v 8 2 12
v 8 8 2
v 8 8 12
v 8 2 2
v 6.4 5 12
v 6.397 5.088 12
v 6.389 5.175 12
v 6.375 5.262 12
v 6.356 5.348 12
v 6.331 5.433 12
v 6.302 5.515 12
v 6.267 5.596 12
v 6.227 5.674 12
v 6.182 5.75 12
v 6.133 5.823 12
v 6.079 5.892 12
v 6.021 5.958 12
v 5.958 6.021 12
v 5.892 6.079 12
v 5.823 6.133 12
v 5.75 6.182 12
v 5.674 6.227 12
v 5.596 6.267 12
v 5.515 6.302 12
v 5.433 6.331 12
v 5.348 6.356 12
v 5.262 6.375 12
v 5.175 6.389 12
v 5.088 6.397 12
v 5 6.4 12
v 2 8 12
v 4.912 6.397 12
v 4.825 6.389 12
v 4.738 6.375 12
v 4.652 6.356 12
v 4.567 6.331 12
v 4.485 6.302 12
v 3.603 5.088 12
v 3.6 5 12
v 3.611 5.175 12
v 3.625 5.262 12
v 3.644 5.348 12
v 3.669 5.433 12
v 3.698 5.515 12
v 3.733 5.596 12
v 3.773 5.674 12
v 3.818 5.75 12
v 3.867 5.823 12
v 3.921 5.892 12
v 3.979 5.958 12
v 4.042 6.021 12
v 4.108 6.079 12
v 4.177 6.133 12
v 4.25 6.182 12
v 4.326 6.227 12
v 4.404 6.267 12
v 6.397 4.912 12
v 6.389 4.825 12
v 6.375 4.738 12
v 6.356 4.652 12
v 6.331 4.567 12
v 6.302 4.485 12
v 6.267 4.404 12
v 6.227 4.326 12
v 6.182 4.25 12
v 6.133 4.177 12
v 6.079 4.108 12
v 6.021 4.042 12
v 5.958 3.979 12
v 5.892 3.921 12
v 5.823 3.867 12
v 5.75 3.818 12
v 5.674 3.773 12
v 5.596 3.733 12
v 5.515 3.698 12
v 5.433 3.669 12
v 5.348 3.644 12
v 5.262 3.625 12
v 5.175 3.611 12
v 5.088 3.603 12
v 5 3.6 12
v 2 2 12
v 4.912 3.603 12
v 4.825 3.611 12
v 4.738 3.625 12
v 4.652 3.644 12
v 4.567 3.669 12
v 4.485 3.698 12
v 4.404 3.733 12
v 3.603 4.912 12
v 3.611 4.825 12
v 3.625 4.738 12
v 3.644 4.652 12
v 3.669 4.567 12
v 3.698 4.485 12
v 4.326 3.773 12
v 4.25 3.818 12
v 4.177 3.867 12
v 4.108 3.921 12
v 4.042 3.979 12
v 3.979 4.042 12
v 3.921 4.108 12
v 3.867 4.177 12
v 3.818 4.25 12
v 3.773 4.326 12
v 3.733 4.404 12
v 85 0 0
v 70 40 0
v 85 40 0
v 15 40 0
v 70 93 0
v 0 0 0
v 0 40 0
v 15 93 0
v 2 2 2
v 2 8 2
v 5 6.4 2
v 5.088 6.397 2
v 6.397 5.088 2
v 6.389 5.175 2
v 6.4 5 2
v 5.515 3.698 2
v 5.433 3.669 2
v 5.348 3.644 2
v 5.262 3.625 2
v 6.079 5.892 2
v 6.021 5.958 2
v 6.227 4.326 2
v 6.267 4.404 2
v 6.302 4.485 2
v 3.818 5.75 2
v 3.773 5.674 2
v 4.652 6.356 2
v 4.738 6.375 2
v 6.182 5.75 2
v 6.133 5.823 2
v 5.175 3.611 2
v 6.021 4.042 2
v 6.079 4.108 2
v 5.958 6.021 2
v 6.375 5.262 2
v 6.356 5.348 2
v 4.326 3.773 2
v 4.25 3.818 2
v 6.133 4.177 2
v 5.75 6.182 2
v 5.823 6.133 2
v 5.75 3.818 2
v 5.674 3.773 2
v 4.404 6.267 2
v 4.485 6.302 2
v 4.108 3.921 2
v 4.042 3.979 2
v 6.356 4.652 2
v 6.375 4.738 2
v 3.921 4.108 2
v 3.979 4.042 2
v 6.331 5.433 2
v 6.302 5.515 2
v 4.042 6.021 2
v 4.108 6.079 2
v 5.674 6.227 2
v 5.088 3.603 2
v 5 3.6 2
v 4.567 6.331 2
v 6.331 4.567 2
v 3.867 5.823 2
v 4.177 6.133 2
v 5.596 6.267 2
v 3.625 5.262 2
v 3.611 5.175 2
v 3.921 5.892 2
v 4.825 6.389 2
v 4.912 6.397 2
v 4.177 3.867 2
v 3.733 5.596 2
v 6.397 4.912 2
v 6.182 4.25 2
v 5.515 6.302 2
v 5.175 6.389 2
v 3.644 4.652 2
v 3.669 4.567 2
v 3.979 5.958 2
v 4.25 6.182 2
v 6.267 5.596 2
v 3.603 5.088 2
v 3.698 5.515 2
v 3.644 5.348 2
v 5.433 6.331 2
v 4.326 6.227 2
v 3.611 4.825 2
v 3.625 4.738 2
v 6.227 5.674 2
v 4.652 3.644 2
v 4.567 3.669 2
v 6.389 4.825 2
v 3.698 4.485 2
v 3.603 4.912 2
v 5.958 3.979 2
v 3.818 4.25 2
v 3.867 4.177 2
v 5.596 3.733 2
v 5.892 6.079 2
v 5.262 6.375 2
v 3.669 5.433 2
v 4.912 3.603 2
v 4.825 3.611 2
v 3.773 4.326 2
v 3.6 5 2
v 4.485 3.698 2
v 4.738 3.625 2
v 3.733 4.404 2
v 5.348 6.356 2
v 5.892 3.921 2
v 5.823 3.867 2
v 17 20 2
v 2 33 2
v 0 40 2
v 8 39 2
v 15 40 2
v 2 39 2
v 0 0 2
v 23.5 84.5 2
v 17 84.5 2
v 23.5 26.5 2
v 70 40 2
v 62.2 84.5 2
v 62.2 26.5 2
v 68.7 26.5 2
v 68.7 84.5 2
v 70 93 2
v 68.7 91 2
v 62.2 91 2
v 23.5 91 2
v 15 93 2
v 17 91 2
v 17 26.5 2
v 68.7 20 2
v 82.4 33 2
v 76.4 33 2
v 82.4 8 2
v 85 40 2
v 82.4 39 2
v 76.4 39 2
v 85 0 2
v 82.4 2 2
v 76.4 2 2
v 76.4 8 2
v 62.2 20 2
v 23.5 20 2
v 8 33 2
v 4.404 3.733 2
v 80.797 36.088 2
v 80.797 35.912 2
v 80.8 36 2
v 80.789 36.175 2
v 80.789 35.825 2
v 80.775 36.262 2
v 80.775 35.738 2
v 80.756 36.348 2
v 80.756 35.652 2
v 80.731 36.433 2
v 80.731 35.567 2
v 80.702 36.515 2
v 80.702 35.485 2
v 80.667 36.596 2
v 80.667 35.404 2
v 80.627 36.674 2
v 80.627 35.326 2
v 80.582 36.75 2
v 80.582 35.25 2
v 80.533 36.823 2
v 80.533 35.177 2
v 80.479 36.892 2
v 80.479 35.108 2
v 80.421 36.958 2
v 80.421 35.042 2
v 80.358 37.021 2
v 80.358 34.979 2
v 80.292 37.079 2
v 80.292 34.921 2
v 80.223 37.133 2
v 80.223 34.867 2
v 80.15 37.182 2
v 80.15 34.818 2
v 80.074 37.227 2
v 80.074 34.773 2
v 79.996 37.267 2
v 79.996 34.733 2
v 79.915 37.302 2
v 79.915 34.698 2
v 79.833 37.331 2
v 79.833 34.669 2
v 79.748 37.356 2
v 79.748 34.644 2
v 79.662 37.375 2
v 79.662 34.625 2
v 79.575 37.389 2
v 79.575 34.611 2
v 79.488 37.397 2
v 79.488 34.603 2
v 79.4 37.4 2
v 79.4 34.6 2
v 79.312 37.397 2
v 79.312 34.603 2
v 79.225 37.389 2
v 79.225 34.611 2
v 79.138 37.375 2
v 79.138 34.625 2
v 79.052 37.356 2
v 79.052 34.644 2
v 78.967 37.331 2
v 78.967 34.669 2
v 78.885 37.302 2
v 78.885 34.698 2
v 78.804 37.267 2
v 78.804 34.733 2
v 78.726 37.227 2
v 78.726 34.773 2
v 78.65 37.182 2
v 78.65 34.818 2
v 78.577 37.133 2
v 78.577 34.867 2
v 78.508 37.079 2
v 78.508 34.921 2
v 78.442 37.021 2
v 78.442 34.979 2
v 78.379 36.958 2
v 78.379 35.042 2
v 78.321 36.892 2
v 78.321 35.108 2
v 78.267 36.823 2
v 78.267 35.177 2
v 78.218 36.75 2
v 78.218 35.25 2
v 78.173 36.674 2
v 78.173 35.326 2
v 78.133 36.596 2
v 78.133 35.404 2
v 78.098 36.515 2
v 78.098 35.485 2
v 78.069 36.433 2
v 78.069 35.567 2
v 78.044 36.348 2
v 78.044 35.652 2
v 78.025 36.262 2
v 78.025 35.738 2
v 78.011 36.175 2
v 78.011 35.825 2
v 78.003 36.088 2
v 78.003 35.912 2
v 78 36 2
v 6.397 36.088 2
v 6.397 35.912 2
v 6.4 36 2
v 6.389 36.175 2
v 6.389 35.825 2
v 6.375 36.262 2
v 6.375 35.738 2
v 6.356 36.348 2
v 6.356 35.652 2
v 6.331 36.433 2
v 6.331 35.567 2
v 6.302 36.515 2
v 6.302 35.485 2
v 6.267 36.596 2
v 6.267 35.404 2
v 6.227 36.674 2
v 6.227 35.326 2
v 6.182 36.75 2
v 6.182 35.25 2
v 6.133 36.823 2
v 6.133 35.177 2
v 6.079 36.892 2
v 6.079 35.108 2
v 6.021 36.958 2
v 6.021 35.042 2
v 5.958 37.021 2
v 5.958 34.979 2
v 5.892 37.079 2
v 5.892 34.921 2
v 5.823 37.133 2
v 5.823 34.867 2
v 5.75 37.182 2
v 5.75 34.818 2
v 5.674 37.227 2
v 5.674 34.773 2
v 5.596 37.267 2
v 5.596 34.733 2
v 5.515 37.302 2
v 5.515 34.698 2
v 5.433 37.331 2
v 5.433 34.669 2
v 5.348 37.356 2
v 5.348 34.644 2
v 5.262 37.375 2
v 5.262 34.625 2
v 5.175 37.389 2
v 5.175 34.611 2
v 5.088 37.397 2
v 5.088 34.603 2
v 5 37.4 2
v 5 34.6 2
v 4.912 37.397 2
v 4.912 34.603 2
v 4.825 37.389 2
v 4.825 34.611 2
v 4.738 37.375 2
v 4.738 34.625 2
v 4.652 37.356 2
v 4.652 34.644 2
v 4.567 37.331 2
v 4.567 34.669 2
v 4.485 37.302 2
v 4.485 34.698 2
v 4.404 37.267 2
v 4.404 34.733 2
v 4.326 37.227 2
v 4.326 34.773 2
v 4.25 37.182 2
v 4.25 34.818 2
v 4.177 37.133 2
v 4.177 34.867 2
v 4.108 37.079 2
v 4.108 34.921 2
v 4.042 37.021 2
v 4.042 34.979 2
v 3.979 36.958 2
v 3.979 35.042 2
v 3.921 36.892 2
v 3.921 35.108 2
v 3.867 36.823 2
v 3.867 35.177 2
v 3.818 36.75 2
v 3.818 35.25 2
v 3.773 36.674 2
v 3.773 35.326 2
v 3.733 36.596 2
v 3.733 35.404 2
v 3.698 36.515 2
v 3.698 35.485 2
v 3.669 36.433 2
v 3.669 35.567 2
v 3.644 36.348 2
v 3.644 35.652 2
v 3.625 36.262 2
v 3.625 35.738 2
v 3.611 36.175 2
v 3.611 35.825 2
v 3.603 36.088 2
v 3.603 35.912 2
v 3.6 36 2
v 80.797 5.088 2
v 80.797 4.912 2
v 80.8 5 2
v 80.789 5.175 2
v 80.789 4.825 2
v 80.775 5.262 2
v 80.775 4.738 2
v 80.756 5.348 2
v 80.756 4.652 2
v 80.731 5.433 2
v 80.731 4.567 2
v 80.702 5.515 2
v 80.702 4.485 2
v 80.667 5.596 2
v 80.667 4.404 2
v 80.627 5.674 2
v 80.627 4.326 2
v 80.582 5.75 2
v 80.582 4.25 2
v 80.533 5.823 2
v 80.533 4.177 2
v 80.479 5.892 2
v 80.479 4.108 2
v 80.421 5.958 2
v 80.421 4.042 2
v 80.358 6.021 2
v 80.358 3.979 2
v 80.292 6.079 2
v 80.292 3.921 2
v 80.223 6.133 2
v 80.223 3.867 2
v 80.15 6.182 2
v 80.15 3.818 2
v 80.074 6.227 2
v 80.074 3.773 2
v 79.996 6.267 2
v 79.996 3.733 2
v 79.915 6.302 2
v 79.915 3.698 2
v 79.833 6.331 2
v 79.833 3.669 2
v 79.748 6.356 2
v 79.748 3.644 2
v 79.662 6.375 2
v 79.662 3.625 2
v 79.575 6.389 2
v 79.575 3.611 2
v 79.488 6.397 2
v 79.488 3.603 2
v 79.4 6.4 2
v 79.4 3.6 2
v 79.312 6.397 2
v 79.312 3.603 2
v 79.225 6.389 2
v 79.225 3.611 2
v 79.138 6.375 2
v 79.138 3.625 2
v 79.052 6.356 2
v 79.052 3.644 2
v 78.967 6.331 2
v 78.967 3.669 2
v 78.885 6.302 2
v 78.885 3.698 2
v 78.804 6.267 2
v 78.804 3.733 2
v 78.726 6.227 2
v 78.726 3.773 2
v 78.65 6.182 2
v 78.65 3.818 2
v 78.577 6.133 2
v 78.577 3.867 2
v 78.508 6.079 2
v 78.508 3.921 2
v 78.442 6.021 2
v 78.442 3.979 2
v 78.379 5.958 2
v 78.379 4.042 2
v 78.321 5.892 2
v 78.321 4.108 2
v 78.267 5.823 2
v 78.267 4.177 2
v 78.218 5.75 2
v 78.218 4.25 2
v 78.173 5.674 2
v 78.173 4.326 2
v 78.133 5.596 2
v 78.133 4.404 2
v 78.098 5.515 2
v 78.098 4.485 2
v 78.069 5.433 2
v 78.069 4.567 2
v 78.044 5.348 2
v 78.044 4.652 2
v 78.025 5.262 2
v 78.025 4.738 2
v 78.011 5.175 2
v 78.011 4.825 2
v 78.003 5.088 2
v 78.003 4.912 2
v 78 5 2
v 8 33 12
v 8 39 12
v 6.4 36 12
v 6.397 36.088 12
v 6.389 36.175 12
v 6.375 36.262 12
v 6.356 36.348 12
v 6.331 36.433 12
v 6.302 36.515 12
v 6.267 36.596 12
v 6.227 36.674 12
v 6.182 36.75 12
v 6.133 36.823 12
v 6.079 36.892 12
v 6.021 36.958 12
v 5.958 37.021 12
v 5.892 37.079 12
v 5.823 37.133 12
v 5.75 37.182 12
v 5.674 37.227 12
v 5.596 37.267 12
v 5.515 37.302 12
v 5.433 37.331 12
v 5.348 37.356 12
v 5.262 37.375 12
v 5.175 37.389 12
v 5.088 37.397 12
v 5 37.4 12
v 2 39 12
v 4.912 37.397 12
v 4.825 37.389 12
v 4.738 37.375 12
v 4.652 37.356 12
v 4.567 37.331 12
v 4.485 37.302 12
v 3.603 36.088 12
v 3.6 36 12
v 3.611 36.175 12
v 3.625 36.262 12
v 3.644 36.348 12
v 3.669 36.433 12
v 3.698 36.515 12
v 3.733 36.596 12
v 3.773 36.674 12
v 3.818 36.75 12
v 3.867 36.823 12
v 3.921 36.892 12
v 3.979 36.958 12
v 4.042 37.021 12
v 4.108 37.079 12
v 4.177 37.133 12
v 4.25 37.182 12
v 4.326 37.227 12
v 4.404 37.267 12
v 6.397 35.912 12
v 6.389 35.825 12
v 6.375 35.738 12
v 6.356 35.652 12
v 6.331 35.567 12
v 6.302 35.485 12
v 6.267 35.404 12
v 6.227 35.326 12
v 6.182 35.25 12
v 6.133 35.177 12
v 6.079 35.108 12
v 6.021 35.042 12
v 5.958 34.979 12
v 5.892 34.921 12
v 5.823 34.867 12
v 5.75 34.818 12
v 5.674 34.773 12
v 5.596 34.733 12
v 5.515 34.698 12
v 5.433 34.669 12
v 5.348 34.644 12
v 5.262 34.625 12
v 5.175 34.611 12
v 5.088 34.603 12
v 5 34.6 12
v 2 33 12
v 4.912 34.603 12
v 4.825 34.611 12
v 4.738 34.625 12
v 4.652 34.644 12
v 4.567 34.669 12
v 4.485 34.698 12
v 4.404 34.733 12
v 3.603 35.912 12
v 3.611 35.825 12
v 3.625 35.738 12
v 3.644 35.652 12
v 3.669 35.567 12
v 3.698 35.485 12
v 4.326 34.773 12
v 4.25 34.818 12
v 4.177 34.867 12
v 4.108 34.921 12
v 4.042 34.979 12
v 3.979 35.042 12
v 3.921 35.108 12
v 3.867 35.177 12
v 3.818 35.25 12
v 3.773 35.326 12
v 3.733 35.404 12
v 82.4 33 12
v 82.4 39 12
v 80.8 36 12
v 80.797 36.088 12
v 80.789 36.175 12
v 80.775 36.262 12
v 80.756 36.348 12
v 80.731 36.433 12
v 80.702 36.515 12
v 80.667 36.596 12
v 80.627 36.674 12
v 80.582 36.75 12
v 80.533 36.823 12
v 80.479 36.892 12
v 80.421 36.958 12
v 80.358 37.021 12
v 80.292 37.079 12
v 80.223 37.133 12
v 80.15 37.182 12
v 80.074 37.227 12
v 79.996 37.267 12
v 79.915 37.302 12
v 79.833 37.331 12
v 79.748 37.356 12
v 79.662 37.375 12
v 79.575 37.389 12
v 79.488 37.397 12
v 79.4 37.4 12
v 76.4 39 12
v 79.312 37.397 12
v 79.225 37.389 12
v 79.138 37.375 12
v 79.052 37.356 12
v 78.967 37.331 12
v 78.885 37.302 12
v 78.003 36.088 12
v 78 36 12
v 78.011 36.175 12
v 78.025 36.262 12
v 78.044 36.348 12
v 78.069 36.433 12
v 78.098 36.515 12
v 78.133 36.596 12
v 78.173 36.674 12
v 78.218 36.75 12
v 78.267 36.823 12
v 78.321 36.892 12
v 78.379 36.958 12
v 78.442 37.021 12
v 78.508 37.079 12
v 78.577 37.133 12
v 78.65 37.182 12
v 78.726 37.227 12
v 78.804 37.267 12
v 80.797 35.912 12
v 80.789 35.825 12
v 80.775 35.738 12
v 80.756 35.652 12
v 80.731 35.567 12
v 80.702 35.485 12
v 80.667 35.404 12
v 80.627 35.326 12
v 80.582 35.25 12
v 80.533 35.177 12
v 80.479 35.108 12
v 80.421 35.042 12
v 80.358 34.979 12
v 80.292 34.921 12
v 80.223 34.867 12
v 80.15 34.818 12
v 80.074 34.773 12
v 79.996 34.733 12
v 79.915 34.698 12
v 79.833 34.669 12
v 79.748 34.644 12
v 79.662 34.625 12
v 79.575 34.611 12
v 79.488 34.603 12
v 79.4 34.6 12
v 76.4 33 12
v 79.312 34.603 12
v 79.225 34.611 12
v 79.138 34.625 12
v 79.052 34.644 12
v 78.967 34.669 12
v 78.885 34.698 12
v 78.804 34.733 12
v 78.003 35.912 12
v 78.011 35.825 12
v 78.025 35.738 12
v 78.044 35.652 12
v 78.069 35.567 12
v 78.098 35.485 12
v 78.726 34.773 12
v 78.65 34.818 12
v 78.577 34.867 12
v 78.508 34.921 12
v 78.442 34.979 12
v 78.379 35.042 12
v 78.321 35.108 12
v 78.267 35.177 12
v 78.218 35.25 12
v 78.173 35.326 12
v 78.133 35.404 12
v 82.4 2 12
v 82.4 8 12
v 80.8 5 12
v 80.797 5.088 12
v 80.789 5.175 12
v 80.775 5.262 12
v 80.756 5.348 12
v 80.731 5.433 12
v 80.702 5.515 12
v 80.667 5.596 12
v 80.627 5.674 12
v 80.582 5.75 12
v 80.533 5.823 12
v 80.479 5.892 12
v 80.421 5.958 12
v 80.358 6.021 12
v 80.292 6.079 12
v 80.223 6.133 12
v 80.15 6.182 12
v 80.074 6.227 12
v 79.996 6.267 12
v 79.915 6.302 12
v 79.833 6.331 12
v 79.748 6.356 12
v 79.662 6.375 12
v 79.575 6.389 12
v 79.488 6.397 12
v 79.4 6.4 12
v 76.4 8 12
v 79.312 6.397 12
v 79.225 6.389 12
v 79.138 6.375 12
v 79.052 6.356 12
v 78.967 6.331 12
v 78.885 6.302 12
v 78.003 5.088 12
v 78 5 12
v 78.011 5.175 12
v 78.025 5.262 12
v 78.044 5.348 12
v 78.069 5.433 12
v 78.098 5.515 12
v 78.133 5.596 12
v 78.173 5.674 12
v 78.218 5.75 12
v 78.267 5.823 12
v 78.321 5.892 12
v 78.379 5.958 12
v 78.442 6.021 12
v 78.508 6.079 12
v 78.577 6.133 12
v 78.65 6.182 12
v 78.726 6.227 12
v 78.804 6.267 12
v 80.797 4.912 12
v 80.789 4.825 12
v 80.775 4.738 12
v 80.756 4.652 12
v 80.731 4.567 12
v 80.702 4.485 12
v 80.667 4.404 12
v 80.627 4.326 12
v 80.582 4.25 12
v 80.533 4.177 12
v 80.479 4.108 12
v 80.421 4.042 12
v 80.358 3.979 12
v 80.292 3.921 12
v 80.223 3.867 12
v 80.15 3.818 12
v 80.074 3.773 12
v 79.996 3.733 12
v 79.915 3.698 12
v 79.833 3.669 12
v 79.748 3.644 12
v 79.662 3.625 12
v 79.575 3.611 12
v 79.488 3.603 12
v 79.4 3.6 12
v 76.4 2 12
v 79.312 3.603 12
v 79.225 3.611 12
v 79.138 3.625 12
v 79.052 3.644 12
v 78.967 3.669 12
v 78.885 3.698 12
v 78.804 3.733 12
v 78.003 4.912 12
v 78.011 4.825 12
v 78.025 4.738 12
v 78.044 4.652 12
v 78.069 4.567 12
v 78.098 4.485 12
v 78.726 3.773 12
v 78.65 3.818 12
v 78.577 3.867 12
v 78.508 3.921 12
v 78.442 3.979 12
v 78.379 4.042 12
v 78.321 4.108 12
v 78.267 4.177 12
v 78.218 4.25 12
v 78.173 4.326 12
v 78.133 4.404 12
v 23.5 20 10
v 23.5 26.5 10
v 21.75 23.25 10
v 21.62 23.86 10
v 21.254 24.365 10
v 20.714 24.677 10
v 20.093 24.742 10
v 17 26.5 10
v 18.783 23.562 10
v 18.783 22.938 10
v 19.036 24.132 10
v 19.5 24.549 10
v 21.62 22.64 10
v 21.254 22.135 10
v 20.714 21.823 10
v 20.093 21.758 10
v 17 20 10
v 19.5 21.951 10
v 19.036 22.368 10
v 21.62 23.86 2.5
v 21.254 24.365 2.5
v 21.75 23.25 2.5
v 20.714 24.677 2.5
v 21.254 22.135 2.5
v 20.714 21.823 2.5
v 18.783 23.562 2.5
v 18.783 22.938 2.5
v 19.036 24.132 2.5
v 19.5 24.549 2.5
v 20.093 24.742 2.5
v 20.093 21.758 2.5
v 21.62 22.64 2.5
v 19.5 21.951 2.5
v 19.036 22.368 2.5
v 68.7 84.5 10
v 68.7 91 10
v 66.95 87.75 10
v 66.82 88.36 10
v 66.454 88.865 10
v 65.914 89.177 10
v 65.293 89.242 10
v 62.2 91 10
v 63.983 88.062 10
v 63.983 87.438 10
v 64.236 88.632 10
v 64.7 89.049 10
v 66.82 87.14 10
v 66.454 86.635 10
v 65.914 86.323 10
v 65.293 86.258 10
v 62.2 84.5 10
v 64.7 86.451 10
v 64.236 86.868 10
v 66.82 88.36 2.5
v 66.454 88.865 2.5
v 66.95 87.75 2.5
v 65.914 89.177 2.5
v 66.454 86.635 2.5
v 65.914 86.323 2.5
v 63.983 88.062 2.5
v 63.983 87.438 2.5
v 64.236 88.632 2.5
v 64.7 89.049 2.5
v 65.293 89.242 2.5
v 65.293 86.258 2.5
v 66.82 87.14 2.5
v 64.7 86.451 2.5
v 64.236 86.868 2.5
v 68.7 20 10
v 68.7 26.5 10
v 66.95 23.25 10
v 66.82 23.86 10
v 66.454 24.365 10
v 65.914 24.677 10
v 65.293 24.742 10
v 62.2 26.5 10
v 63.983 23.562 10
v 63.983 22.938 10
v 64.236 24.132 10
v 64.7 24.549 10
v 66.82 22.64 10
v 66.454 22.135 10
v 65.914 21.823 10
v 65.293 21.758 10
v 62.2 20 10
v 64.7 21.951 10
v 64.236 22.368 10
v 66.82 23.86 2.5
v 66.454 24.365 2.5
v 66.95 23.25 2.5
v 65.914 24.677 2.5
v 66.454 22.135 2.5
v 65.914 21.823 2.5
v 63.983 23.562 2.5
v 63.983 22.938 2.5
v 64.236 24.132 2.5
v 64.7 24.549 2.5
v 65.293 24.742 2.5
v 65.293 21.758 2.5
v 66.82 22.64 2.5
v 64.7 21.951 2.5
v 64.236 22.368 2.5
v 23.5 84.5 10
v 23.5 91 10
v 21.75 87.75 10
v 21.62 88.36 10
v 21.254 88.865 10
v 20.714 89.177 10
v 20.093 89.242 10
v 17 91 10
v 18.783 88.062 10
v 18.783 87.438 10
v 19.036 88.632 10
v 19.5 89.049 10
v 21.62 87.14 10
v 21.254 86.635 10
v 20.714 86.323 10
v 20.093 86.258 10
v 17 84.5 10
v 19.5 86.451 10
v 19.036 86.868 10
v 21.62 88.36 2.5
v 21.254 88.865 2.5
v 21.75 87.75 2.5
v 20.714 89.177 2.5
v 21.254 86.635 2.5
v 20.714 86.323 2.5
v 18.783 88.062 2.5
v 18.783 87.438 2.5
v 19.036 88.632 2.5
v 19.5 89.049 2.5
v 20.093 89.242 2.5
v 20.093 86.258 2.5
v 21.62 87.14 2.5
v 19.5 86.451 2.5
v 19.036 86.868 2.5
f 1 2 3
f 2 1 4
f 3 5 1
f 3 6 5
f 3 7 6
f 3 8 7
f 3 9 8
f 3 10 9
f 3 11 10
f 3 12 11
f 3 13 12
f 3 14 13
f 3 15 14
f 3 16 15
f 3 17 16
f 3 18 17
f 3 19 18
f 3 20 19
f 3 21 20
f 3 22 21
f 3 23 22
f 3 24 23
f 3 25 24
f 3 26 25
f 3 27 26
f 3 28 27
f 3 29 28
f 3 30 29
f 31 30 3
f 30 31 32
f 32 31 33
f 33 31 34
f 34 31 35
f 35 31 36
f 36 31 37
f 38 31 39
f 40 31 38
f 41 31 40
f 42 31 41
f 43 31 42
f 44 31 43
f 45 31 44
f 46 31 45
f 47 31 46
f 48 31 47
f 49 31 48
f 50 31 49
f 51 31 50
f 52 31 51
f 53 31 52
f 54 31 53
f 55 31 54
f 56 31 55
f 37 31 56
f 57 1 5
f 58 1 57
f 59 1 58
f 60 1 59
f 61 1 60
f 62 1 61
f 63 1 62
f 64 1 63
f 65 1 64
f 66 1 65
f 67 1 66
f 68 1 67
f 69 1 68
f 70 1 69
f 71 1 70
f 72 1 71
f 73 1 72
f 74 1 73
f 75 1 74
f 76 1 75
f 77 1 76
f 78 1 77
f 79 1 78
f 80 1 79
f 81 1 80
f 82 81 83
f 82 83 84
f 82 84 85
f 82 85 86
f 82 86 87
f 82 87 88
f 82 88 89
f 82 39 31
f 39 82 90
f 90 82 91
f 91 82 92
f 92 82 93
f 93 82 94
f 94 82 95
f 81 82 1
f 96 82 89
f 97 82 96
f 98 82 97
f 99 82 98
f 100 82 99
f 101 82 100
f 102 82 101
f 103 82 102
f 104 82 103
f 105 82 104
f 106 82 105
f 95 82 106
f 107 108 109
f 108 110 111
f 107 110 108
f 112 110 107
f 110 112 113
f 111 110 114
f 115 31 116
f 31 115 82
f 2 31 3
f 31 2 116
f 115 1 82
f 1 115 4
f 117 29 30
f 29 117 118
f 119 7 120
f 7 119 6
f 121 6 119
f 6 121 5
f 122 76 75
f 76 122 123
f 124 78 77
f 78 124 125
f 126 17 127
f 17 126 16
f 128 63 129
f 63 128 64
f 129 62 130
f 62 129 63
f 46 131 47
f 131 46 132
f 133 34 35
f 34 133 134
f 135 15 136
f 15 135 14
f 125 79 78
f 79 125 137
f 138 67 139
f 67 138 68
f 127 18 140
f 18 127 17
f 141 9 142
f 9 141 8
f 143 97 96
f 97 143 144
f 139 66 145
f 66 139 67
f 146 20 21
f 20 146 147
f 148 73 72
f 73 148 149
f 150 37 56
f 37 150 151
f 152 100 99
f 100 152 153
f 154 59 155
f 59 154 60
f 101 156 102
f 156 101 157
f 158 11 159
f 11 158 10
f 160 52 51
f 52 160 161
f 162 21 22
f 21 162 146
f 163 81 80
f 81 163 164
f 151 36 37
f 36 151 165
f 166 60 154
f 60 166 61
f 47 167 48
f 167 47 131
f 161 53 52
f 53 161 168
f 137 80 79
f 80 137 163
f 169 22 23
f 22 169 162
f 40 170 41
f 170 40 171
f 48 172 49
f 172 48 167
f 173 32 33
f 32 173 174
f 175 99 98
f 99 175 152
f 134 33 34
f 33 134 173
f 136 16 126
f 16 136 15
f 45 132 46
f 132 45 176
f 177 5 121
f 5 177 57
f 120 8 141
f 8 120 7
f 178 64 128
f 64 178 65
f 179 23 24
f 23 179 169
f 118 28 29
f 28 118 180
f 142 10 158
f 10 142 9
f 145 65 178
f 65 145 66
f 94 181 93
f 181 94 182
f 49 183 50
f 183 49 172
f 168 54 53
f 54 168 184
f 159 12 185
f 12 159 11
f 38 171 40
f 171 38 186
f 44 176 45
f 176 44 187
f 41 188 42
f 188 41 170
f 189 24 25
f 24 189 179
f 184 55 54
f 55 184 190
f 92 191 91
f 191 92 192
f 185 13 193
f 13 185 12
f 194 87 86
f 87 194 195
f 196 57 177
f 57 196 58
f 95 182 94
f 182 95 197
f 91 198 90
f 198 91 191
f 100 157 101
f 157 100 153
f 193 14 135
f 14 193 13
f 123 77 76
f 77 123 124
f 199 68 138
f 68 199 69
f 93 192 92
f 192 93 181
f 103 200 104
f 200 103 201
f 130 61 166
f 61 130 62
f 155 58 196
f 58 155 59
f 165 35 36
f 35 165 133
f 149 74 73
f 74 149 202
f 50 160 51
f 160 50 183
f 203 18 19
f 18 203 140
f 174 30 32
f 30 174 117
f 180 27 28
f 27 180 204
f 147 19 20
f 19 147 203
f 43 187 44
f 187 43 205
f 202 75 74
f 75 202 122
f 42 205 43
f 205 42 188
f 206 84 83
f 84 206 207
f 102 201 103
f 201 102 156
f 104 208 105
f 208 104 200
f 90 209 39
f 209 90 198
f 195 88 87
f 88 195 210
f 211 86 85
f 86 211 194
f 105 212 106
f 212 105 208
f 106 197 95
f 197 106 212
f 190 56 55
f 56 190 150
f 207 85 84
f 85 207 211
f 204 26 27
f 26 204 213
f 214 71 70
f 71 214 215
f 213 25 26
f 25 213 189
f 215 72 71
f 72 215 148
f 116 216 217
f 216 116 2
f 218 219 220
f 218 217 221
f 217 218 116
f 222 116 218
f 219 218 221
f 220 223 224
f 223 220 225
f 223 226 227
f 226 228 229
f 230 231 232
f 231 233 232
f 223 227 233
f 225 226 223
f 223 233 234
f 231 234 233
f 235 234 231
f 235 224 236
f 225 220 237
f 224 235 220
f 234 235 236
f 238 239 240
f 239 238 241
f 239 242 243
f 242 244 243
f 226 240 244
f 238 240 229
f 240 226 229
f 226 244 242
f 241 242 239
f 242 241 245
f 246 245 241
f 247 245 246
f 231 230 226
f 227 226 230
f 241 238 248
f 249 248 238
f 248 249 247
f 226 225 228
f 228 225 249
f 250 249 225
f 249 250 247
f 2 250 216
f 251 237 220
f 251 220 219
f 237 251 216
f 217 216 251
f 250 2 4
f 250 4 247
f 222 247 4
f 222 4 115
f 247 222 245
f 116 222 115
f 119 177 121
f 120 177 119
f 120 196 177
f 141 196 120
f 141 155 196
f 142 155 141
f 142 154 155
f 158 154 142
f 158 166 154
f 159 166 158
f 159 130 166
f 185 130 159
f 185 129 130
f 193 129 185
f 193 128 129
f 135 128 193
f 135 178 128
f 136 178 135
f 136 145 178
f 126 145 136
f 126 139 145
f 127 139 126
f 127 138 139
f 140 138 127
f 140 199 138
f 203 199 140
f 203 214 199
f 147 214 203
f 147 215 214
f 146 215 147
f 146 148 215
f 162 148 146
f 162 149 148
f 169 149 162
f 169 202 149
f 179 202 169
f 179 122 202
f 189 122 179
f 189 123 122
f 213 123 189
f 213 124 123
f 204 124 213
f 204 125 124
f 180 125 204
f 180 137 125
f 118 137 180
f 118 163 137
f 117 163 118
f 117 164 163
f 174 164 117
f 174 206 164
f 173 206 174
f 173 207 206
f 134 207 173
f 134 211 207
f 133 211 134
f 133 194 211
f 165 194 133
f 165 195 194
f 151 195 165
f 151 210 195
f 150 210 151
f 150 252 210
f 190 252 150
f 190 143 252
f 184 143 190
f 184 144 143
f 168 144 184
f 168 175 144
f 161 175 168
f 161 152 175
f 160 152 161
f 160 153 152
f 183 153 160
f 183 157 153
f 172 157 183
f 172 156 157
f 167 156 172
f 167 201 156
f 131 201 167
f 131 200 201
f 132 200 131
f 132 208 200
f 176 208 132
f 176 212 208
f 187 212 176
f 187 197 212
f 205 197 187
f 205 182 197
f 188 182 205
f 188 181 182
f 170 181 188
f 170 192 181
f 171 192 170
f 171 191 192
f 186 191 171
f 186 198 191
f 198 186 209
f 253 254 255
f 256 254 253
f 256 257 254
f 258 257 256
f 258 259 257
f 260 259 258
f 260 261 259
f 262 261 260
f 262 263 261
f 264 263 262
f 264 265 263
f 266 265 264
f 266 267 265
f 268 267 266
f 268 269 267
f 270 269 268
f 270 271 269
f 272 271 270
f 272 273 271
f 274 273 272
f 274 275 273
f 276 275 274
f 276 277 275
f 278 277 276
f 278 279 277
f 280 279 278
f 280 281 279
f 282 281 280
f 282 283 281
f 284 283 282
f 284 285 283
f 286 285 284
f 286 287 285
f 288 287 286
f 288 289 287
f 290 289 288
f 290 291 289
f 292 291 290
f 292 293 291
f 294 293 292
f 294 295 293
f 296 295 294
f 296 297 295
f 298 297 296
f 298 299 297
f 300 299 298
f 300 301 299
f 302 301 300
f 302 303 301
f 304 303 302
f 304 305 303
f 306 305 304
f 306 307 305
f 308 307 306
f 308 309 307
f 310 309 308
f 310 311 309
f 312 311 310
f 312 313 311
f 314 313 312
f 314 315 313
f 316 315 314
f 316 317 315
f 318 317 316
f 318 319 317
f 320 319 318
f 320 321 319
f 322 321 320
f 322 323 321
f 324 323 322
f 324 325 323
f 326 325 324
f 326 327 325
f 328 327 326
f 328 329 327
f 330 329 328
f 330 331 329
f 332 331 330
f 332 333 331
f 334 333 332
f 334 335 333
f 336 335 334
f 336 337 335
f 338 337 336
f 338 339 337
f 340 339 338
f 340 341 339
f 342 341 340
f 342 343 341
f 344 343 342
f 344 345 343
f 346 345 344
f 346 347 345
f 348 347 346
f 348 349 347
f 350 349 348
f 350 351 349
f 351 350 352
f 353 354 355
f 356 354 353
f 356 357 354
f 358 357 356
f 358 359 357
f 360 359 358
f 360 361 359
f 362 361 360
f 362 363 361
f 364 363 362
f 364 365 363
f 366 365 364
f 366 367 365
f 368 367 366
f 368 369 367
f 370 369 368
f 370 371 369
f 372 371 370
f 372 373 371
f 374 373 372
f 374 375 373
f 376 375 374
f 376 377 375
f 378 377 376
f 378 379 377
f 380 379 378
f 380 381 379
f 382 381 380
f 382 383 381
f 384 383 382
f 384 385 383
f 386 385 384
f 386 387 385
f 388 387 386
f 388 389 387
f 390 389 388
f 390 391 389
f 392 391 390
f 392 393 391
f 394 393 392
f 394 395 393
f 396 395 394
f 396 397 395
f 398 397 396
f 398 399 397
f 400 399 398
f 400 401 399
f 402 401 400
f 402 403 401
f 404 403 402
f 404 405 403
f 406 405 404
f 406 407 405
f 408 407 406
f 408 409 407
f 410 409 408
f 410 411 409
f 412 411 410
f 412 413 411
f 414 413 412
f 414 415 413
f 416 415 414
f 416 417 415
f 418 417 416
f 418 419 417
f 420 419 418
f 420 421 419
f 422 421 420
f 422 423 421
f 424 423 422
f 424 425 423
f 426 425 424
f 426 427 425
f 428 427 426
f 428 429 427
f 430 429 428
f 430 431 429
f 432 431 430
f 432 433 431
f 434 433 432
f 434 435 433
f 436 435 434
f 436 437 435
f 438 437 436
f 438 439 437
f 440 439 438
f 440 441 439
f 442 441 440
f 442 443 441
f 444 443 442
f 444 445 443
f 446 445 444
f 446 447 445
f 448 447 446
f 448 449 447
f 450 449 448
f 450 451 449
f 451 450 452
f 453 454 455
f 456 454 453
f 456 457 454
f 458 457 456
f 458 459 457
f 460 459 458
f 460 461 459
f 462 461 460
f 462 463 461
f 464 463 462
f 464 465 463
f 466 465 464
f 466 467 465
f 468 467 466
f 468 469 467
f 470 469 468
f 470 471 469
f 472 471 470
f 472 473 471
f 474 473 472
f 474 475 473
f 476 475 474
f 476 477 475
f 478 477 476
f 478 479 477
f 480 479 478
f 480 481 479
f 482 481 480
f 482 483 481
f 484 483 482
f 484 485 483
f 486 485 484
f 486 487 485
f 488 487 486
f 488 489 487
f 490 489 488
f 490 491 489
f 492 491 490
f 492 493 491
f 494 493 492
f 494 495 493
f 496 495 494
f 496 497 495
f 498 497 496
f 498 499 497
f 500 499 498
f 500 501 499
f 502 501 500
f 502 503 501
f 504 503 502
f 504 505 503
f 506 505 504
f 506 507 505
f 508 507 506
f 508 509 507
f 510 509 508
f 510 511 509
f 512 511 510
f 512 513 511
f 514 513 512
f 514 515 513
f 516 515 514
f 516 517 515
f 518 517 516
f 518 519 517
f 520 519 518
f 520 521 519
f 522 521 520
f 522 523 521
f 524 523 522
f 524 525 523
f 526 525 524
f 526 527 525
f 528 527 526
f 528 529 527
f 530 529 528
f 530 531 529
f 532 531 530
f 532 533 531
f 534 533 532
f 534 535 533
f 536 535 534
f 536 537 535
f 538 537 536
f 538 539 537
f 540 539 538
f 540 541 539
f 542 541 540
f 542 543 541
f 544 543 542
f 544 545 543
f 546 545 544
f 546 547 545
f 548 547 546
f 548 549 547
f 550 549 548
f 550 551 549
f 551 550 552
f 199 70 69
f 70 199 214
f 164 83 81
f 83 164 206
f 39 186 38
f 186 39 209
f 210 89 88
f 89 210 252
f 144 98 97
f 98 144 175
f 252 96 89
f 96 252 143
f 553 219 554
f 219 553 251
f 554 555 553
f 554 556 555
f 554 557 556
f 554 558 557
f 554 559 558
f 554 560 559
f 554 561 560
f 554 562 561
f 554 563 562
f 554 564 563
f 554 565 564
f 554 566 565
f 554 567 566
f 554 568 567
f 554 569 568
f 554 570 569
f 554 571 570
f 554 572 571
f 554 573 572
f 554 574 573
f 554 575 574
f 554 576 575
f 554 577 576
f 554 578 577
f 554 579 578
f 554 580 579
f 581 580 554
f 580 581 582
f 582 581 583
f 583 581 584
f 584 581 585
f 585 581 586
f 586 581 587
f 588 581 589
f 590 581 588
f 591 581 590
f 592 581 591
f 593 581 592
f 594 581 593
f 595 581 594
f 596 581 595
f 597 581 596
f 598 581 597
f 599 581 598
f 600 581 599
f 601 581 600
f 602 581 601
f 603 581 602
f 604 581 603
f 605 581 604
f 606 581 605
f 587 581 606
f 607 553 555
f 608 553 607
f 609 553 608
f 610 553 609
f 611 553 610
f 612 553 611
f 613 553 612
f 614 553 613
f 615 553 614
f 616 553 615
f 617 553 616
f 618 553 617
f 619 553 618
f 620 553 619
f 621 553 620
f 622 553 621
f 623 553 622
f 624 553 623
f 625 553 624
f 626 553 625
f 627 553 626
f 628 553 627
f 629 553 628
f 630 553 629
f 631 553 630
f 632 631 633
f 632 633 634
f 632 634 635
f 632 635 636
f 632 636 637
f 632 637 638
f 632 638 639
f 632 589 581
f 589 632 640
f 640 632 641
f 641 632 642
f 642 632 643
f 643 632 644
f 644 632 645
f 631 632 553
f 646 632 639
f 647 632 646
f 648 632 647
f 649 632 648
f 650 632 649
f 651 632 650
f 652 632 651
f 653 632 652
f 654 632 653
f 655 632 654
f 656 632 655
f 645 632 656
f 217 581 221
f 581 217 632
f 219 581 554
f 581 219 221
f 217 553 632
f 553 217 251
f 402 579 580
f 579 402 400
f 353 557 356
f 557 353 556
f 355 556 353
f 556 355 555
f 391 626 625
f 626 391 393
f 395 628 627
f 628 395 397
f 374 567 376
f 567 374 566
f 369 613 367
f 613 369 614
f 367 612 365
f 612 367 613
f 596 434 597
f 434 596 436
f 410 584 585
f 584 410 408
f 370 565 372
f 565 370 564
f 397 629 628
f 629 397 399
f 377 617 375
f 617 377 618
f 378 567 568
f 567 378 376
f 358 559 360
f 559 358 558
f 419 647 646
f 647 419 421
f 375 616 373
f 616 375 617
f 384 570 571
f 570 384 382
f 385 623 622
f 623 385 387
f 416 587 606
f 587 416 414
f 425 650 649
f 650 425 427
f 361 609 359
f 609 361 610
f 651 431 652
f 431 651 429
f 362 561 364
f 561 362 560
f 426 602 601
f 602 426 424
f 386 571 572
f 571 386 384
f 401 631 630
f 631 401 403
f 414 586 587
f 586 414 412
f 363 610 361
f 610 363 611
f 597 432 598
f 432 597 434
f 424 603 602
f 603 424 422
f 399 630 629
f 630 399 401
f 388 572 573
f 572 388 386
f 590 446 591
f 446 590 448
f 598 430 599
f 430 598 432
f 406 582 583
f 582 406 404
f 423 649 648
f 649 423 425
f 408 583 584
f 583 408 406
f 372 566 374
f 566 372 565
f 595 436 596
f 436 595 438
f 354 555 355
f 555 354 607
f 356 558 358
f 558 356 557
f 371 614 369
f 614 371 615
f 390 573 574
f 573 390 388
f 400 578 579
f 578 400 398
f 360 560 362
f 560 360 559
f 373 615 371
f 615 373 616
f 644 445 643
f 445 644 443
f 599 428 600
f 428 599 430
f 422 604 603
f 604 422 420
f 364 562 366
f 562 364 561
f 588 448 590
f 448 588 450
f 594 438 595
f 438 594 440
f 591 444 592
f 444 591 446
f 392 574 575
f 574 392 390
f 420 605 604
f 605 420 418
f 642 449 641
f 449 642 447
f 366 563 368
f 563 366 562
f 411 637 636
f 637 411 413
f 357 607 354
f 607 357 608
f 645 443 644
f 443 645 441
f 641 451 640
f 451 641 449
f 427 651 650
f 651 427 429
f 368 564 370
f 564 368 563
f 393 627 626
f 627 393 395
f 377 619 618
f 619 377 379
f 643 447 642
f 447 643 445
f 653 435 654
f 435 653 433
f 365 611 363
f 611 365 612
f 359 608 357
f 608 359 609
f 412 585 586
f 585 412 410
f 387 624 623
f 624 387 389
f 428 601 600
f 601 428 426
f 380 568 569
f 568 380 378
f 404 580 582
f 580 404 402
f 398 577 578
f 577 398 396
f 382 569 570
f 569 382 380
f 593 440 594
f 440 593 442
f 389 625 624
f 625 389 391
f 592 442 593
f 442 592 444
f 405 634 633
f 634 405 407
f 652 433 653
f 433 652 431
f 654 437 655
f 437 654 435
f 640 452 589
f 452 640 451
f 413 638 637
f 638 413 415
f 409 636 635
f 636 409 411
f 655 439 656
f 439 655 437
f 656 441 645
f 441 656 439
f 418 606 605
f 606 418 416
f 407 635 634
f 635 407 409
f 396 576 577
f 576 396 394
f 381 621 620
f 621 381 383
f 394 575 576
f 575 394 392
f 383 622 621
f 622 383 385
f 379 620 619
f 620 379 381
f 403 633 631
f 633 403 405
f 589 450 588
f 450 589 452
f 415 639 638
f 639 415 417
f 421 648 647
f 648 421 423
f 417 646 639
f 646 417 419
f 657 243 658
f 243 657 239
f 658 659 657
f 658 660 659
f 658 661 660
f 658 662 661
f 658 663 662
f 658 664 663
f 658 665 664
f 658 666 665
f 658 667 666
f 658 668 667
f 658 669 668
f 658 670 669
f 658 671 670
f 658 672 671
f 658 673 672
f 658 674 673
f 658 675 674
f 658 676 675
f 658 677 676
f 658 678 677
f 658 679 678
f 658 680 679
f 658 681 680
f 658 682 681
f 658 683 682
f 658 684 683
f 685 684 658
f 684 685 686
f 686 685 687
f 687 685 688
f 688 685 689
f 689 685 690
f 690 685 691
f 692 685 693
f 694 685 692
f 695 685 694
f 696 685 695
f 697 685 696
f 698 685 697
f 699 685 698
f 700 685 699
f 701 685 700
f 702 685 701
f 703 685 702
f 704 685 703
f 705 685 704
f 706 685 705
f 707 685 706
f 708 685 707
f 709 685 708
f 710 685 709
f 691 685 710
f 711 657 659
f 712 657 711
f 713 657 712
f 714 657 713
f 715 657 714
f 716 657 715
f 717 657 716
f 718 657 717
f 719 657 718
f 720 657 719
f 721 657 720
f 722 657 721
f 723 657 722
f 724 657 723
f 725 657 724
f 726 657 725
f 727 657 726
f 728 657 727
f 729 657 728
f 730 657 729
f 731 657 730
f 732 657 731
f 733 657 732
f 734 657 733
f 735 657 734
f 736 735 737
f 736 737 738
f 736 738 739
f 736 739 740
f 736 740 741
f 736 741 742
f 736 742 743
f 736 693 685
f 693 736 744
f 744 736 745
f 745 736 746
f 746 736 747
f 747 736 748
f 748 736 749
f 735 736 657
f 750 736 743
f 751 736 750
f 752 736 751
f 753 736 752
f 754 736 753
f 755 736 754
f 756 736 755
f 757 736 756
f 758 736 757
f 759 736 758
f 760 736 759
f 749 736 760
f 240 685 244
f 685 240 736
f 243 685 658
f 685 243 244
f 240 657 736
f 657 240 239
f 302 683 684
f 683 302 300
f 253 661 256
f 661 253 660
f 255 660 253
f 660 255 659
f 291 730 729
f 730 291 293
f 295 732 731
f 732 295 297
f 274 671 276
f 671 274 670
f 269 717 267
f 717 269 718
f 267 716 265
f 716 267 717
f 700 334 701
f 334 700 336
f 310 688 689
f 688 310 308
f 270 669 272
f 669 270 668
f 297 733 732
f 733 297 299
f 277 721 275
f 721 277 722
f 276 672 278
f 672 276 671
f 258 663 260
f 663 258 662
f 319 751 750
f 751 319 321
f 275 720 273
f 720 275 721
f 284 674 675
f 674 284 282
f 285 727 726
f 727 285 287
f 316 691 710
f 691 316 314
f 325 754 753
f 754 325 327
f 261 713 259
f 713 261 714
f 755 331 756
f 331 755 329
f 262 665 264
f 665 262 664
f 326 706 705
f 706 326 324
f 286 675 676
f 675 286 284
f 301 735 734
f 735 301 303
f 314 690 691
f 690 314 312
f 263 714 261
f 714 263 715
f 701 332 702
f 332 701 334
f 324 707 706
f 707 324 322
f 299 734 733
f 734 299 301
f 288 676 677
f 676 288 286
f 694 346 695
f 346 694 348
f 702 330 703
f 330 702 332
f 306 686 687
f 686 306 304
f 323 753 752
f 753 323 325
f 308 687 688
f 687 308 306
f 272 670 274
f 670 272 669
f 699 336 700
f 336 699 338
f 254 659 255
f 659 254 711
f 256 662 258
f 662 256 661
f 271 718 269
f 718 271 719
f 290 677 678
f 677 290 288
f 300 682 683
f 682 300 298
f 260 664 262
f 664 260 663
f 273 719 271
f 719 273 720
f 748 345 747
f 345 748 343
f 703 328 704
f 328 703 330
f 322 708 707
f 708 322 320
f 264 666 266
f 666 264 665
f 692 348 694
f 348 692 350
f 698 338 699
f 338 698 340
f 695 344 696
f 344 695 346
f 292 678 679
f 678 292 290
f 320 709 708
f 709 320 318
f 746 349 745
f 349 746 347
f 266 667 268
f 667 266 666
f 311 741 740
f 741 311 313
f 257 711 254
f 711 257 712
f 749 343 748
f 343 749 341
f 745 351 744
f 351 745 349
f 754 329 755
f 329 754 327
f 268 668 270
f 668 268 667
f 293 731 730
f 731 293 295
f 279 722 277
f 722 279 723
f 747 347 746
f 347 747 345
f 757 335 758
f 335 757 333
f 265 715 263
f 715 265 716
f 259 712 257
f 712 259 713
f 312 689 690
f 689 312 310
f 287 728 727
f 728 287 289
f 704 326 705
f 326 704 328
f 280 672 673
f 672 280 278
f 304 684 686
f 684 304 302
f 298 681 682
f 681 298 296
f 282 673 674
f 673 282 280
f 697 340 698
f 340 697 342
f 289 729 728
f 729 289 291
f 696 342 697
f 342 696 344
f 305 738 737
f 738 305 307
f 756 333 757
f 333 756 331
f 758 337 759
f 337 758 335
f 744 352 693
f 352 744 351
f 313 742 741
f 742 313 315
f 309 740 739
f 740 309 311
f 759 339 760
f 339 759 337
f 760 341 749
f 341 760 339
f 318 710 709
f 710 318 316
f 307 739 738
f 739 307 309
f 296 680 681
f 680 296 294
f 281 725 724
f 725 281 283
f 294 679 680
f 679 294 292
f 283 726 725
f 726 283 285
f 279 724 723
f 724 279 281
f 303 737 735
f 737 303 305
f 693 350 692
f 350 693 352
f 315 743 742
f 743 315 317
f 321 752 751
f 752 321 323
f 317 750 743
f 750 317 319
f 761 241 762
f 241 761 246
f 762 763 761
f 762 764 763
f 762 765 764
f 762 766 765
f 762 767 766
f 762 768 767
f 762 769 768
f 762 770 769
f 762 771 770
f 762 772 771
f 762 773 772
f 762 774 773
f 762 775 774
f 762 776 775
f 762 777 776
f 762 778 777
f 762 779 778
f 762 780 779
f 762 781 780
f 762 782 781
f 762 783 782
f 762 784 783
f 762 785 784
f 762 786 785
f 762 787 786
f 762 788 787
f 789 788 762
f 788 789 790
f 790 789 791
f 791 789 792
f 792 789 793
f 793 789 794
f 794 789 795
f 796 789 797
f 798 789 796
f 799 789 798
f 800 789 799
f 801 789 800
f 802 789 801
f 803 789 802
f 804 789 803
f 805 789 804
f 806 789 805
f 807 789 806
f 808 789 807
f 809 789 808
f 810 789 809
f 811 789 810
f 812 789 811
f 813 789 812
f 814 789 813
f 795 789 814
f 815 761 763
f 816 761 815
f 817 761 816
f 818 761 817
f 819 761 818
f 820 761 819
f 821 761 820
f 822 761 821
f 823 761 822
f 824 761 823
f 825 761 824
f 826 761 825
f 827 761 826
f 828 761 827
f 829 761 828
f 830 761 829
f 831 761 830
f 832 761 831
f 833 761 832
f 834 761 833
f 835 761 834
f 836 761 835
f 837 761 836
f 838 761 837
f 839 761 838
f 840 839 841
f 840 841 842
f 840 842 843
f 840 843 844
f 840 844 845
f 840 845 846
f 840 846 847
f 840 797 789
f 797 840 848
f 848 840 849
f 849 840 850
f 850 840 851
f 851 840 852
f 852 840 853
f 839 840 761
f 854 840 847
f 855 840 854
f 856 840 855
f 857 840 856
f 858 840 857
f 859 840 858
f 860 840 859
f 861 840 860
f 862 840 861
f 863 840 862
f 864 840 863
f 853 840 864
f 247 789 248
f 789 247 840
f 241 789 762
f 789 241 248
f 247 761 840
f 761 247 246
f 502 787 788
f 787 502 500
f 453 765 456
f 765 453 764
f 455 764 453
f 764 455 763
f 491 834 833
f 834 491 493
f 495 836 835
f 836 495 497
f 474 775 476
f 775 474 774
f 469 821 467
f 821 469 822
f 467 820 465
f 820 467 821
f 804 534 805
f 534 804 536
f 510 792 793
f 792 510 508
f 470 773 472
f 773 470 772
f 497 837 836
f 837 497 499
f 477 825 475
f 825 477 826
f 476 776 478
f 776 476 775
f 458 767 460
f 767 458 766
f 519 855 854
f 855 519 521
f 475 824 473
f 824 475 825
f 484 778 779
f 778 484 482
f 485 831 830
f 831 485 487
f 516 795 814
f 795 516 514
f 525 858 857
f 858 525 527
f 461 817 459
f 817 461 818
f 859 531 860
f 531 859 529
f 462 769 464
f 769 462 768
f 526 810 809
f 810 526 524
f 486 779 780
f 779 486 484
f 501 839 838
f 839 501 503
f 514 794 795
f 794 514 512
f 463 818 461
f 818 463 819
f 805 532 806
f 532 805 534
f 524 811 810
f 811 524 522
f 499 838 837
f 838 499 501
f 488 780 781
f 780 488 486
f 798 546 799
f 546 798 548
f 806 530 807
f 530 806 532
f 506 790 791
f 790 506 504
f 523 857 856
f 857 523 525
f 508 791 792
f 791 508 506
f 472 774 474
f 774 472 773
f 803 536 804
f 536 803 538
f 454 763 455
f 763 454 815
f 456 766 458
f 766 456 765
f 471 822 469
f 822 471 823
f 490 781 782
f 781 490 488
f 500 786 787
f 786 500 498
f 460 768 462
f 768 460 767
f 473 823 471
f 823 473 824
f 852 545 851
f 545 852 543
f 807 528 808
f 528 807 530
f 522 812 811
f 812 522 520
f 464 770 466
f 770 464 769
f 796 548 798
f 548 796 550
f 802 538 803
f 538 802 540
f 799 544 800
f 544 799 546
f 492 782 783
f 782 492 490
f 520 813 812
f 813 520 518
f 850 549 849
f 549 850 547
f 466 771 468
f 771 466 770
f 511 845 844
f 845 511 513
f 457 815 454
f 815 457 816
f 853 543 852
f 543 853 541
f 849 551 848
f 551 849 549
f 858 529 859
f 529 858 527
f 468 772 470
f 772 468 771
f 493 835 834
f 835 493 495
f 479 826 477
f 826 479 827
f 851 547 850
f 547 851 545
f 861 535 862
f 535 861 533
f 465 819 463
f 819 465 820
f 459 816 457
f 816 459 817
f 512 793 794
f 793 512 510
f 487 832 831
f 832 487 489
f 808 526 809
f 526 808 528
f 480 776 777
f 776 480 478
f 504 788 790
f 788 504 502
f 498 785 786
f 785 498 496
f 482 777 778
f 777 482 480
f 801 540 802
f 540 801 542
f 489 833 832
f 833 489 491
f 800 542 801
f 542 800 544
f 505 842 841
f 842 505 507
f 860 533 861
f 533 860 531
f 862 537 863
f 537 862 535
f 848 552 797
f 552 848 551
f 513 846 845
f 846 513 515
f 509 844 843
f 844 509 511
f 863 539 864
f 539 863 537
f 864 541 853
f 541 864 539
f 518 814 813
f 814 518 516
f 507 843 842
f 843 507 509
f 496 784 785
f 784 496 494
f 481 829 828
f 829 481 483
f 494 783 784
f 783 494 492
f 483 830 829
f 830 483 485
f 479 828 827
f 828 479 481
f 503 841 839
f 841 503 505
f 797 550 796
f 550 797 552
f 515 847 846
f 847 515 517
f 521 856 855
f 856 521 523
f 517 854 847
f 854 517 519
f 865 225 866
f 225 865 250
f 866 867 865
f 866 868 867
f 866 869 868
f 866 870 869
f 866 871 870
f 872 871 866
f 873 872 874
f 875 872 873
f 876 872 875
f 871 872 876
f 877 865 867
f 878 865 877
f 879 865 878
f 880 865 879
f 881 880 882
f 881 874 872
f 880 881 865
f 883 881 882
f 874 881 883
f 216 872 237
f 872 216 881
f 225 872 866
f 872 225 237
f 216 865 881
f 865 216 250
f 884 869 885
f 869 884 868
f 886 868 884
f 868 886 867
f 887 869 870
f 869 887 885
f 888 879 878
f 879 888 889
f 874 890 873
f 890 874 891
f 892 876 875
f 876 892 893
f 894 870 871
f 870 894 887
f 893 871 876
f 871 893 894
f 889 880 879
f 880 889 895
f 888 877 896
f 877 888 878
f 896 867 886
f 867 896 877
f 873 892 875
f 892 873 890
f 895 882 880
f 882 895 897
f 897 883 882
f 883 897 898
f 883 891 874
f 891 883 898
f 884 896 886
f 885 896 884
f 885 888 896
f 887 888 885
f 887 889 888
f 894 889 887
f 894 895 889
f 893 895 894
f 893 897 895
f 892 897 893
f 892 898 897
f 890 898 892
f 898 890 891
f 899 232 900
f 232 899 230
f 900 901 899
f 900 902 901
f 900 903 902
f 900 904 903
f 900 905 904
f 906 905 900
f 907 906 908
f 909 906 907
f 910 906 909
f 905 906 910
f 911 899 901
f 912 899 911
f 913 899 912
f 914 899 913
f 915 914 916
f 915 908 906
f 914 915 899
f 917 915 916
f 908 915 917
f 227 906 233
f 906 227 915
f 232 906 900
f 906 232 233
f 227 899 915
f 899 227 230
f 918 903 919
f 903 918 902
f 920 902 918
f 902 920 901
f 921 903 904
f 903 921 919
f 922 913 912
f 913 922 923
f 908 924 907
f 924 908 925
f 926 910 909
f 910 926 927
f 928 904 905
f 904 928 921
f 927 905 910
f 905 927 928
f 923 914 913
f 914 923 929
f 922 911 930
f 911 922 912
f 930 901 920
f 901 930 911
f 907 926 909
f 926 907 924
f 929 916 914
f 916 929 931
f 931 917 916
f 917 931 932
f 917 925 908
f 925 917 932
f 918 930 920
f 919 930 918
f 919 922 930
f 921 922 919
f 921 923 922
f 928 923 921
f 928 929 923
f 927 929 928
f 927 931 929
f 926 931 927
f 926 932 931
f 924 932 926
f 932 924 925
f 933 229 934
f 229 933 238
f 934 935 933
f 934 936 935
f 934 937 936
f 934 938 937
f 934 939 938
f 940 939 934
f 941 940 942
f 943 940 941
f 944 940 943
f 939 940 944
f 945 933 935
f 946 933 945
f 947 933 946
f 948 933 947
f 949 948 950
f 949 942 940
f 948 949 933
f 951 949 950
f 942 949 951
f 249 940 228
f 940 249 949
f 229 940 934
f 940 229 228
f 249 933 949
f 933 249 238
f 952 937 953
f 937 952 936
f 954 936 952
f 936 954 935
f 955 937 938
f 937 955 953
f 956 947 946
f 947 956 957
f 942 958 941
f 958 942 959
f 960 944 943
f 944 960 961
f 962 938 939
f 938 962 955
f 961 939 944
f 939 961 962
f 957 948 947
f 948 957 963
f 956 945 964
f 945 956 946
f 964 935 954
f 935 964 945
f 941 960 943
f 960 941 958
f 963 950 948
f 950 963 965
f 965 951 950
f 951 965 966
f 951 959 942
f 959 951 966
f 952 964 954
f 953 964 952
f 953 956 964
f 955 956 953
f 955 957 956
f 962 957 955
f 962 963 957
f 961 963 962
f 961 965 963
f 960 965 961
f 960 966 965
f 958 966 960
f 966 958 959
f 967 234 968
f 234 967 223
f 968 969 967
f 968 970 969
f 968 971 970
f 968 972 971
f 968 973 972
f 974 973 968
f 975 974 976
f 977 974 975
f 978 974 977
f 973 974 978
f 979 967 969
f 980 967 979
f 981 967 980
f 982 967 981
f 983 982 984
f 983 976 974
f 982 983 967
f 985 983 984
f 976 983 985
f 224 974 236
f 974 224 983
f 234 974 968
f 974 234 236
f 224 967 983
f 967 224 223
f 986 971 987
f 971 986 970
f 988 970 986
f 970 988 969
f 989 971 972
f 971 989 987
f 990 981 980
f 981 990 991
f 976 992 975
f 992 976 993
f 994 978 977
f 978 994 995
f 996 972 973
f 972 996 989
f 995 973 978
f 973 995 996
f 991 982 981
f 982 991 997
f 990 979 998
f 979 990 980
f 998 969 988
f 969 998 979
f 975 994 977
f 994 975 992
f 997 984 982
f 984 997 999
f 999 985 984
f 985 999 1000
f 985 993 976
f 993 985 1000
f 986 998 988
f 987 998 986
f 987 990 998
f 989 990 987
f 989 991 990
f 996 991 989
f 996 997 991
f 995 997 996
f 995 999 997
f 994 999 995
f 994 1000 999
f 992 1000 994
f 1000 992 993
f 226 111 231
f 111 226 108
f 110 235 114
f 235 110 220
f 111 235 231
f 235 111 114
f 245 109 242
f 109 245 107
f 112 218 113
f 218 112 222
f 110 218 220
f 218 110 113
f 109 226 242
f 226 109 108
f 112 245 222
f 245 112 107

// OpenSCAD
module standoff_holder(xyz=[0,0,0]) {
    insert_height = 10;
    bottom_thickness = 2;
    cube_dim = [6,6];
    standoff_r = 1.4;

    translate([xyz[0], xyz[1], xyz[2]+bottom_thickness]){
    difference(){
    translate([0,0,-bottom_thickness + (insert_height + bottom_thickness)/2]){
        cube([cube_dim[0],cube_dim[1],insert_height+bottom_thickness],center=true);
    }

    cylinder(20,standoff_r ,standoff_r ,$fn=100);
    }
    }
}

module heat_set_insert(translate_pos = [0,0,0], insert_xy_dim = [6.5,6.5], insert_height = 10, hole_r=1.5, hole_h=7.5, cylinder_fn = 15){
    insert_width = insert_xy_dim[0];
    insert_depth = insert_xy_dim[1];
    insert_height = insert_height;
    
    translate(translate_pos){
        difference(){
        cube([insert_width,insert_depth,insert_height]);
            translate([insert_width/2,insert_depth/2,insert_height - hole_h]){
                cylinder(hole_h+1,hole_r,hole_r, $fn=cylinder_fn);
            }
        }
    }
}

bottom_thickness = 2;
chassis_lcd_dim = [85,40,bottom_thickness];
chassis_perfboard_dim = [55,75,bottom_thickness];


cube(chassis_lcd_dim);
translate([5,5,0]){
standoff_holder(xyz=[0,0,0]);
standoff_holder(xyz=[0,31.0,0]);
standoff_holder(xyz=[74.4,31.0,0]);
standoff_holder(xyz=[74.4,0,0]);
}

translate([17,20,0]){
    translate([-2,-2,0]){
cube(chassis_perfboard_dim);}
heat_set_insert(translate_pos=[0,0,0]);
heat_set_insert(translate_pos=[45.2,64.5,0]);
heat_set_insert(translate_pos=[45.2,0,0]);
heat_set_insert(translate_pos=[0,64.5,0]);
    }
